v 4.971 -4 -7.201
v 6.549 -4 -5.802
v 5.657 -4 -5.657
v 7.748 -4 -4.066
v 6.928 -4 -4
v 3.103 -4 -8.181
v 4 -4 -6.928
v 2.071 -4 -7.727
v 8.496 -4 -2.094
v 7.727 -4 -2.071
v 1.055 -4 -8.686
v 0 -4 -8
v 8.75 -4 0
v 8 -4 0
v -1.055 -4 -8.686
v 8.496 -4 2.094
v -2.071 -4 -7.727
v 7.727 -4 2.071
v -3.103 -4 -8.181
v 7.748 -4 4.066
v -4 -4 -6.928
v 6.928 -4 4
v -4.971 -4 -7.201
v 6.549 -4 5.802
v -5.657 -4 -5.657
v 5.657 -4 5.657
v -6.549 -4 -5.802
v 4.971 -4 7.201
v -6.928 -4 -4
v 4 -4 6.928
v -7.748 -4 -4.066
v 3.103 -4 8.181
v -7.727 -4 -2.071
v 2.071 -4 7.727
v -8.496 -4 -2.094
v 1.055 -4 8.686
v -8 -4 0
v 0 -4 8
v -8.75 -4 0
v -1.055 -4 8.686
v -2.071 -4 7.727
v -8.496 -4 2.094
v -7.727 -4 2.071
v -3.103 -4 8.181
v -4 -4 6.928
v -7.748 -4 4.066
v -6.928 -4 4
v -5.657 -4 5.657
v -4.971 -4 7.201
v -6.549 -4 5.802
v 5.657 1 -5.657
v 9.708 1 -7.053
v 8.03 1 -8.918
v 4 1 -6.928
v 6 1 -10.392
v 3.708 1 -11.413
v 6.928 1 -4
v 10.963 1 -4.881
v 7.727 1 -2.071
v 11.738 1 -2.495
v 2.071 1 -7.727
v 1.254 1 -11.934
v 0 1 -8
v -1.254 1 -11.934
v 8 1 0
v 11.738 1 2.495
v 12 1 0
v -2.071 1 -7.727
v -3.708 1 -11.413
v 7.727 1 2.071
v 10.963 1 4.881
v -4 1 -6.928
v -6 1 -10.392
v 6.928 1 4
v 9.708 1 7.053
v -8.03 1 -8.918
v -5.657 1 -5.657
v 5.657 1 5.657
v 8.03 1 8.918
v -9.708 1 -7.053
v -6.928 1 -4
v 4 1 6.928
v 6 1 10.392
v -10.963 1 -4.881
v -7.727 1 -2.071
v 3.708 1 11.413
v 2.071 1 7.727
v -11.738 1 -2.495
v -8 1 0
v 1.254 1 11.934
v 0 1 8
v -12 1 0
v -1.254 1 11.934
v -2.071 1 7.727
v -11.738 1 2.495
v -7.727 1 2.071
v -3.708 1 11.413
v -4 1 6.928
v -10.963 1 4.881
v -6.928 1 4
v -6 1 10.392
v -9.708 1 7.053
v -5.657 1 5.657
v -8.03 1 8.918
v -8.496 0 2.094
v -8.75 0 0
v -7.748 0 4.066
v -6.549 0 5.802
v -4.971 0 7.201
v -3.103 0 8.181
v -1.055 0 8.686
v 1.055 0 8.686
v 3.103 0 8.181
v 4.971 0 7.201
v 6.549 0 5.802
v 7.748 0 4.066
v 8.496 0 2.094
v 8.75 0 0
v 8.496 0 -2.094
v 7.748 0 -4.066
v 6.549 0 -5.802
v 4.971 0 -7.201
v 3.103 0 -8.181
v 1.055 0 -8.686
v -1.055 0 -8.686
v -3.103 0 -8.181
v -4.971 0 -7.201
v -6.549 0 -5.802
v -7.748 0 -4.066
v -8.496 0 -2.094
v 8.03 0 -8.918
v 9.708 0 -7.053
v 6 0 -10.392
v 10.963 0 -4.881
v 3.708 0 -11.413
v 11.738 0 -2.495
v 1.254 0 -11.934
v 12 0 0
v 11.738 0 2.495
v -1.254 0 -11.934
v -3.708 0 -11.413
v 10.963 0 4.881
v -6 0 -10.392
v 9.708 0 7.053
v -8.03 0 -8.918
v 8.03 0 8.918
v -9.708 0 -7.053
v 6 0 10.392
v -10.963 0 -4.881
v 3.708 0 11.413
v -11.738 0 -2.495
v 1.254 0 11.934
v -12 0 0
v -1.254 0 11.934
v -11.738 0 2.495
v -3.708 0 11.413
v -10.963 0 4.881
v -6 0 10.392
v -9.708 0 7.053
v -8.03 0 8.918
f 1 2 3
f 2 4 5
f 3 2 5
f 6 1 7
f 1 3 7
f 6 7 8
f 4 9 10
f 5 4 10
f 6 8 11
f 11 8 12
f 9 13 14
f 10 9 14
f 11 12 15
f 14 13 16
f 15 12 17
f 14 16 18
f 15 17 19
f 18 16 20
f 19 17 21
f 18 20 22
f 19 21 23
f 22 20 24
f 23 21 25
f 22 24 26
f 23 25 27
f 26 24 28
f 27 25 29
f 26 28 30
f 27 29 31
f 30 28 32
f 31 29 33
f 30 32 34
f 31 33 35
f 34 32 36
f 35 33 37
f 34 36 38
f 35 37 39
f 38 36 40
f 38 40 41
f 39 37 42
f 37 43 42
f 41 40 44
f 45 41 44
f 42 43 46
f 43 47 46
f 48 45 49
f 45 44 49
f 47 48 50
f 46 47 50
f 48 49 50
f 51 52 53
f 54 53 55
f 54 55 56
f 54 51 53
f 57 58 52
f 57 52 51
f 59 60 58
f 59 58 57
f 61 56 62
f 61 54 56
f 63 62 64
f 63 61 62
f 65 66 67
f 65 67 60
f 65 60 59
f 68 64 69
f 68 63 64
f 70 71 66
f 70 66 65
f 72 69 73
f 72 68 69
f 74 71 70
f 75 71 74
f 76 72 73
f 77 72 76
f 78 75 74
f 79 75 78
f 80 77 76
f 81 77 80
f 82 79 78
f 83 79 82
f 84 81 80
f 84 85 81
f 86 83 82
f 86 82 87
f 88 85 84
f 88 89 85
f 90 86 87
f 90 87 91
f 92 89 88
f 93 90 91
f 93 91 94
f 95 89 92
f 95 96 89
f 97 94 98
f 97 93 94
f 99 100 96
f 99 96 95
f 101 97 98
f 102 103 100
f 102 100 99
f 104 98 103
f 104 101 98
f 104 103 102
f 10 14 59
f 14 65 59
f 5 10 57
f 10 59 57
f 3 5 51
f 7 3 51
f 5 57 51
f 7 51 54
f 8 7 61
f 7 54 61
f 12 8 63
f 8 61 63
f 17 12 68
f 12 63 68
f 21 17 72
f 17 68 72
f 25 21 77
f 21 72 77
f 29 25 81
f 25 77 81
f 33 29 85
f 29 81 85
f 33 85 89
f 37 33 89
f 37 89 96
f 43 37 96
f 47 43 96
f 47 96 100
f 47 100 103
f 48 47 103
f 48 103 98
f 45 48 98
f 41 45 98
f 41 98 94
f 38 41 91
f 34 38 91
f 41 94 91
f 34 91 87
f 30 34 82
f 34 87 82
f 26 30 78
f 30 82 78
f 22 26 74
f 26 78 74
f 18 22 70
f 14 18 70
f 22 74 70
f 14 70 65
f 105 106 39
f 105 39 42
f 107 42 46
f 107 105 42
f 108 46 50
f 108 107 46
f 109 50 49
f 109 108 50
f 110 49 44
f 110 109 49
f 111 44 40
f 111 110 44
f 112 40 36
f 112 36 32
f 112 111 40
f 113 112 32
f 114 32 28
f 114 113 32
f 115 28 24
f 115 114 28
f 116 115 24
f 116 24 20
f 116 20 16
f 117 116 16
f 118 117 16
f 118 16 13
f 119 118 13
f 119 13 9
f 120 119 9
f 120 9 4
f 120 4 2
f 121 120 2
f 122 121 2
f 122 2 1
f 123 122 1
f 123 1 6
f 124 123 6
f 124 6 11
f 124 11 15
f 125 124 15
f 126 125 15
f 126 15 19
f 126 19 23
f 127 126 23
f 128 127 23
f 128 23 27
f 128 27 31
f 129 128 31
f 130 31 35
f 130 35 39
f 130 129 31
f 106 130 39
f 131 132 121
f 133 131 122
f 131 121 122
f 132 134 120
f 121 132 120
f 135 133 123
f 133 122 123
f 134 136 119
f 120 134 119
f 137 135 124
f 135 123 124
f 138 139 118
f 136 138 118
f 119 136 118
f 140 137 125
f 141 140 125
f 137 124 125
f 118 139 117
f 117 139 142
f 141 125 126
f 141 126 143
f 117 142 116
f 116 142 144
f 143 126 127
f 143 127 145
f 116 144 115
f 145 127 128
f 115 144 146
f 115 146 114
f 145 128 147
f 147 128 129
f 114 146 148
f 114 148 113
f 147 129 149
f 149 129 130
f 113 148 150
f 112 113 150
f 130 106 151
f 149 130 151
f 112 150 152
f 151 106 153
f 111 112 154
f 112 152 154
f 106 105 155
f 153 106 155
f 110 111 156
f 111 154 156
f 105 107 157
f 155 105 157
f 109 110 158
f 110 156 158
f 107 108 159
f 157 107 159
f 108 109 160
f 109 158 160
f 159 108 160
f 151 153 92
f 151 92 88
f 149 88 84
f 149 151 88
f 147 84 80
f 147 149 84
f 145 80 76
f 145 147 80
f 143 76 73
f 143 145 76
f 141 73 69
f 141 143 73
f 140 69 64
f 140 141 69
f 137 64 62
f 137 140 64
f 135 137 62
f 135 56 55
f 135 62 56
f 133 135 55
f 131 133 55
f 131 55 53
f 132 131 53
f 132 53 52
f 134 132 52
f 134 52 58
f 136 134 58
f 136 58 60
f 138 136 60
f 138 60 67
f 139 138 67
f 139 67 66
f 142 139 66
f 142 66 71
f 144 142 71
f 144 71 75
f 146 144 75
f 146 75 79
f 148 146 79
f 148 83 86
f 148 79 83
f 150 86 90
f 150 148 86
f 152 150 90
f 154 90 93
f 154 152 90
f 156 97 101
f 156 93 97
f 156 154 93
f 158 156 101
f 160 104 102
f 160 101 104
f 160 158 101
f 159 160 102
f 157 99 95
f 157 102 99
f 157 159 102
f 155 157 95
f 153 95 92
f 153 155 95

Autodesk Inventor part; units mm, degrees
ref_plane "YZ Plane" through (0, 0, 0) normal (1, 0, 0) x (0, 1, 0)
ref_plane "XZ Plane" through (0, 0, 0) normal (0, 1, 0) x (-1, 0, 0)
ref_plane "XY Plane" through (0, 0, 0) normal (0, 0, 1) x (1, 0, 0)
sketch "Эскиз1" plane through (0, 0, 0) normal (0, 1, 0) x (-1, 0, 0)
  circle A0 centre (0, 0) radius 8.75
  dimension "d0" = 17.5
sketch "Эскиз2" plane through (0, 0, 0) normal (0, 1, 0) x (-1, 0, 0)
  circle A0 centre (0, 0) radius 12
  dimension "d1" = 24
extrude "Выдавливание1" add sketch "Эскиз2" along normal blind 1
extrude "Выдавливание2" add sketch "Эскиз1" against normal blind 4
sketch "Эскиз3" plane through (0, 1, 0) normal (0, 1, 0) x (1, 0, 0)
  circle A0 centre (0, 0) radius 8
  dimension "d6" = 16
extrude "Выдавливание3" cut sketch "Эскиз3" against normal blind 6
properties part number "Blumat_holder"
